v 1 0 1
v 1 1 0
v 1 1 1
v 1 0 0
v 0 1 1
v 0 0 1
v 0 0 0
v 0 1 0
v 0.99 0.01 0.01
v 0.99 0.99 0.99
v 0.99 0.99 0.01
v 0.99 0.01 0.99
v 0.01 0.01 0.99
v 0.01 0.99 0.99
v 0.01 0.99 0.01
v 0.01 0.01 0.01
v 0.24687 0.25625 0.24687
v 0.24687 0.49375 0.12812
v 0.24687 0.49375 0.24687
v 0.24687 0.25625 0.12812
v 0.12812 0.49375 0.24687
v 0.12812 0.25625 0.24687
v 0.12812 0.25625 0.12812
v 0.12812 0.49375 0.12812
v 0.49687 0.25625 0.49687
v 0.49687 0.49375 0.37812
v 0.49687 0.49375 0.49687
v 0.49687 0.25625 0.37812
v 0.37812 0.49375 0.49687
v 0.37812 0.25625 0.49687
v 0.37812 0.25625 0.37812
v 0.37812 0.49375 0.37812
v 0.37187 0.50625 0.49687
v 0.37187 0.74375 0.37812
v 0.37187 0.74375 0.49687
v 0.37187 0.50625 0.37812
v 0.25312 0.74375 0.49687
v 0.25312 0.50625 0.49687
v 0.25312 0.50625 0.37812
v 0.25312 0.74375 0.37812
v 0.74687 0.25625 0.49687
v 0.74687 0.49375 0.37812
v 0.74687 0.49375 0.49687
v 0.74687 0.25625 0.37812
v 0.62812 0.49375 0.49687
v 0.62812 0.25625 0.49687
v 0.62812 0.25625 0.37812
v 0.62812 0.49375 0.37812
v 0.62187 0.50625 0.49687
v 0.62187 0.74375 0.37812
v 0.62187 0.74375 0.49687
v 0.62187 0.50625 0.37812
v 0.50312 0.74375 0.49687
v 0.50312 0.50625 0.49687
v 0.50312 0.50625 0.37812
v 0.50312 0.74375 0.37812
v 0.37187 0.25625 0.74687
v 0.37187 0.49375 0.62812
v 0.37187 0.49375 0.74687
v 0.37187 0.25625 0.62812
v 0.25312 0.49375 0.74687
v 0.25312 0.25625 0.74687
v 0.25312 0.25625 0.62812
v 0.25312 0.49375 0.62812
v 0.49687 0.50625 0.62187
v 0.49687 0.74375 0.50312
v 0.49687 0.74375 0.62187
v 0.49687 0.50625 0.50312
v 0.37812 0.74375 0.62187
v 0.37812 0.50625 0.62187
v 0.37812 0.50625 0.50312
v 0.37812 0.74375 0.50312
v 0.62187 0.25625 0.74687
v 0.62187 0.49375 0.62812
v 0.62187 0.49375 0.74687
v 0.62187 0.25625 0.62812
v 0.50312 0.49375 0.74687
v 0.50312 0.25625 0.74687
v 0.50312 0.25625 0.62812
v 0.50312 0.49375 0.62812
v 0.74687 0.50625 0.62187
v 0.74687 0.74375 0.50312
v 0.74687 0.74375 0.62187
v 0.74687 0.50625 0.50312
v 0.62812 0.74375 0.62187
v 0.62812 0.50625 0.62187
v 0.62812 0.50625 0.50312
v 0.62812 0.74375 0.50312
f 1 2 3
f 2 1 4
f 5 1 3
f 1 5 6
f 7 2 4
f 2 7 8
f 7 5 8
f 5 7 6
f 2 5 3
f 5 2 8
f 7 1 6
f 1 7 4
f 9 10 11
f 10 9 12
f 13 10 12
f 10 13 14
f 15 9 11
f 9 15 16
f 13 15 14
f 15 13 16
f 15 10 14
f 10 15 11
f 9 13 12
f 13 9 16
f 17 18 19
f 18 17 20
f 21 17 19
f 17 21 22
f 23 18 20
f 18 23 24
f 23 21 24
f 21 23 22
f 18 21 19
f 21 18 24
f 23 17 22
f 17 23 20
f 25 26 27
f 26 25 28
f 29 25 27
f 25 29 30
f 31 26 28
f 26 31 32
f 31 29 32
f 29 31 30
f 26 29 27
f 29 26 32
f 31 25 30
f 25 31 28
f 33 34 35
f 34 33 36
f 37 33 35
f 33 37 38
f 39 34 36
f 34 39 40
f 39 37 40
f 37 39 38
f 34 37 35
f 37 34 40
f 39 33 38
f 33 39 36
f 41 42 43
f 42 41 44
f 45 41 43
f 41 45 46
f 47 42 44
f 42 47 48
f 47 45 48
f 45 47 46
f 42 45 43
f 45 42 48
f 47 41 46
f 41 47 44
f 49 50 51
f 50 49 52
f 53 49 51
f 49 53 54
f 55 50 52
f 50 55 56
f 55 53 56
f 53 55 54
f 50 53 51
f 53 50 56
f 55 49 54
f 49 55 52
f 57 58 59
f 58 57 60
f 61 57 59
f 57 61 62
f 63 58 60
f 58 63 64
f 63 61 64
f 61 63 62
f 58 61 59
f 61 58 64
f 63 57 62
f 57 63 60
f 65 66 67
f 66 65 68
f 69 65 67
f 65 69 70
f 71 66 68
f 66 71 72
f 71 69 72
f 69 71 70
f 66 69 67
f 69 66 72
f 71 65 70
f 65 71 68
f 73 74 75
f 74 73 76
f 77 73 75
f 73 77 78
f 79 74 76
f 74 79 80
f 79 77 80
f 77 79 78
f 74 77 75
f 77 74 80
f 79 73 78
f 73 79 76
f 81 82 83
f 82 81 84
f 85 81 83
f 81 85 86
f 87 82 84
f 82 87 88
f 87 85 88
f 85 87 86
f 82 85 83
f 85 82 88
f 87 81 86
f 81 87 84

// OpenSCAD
translate([0.1875, 0.375, 0.1875]) color([0.04941488832108687, 0.9243989960853036, 0.6796238522220975]) cube([0.11875, 0.2375, 0.11875], center=true);
translate([0.4375, 0.375, 0.4375]) color([0.6165643145748532, 0.9826833521119438, 0.0255927122392261]) cube([0.11875, 0.2375, 0.11875], center=true);
translate([0.3125, 0.625, 0.4375]) color([0.6460098231560203, 0.7522484787761982, 0.959270299831535]) cube([0.11875, 0.2375, 0.11875], center=true);
translate([0.6875, 0.375, 0.4375]) color([0.1341133561002753, 0.3957775621053963, 0.2636741843460868]) cube([0.11875, 0.2375, 0.11875], center=true);
translate([0.5625, 0.625, 0.4375]) color([0.0089931536744019, 0.6293882137700114, 0.10699193015934139]) cube([0.11875, 0.2375, 0.11875], center=true);
translate([0.3125, 0.375, 0.6875]) color([0.7175713197745442, 0.005780007793811381, 0.39173693032620005]) cube([0.11875, 0.2375, 0.11875], center=true);
translate([0.4375, 0.625, 0.5625]) color([0.2452081522136732, 0.6267109108994009, 0.6522834644017423]) cube([0.11875, 0.2375, 0.11875], center=true);
translate([0.5625, 0.375, 0.6875]) color([0.9794507075148736, 0.15836622274147494, 0.5120520304374113]) cube([0.11875, 0.2375, 0.11875], center=true);
translate([0.6875, 0.625, 0.5625]) color([0.2530044018495886, 0.9503290425104016, 0.5032765343031246]) cube([0.11875, 0.2375, 0.11875], center=true);
color([0.3,0.3,0.3,0.3]) difference() { cube([1,1,1]); translate([0.01,0.01,0.01]) cube([0.98,0.98,0.98]); }
